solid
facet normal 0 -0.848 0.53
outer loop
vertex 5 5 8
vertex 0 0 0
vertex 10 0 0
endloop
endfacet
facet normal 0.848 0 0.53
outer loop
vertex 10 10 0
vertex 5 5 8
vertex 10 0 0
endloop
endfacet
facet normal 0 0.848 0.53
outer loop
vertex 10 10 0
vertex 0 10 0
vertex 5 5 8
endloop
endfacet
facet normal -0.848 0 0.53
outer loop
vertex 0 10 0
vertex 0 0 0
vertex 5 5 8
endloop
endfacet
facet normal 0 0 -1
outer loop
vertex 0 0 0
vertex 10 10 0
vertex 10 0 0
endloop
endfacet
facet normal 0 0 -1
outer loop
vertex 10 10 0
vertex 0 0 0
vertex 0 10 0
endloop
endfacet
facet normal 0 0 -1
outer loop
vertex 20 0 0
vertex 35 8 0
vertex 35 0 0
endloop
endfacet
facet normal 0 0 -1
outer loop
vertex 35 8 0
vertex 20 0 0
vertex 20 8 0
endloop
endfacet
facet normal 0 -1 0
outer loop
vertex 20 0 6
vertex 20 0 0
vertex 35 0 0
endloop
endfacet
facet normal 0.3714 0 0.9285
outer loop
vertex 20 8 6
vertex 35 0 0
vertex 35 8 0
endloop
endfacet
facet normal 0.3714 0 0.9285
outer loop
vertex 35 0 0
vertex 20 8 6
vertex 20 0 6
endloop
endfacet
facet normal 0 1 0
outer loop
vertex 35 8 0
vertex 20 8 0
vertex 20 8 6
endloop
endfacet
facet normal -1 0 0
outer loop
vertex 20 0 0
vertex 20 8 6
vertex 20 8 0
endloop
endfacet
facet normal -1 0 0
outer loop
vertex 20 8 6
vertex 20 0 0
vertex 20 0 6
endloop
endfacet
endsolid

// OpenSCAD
// Zweck: polyhedron – Pyramide und Keil mit ebenen Flächen (Flächen im Uhrzeigersinn von außen).
polyhedron(
    points = [[0, 0, 0], [10, 0, 0], [10, 10, 0], [0, 10, 0], [5, 5, 8]],
    faces = [[0, 1, 4], [1, 2, 4], [2, 3, 4], [3, 0, 4], [1, 0, 3, 2]]
);
translate([20, 0, 0]) polyhedron(
    [[0, 0, 0], [15, 0, 0], [15, 8, 0], [0, 8, 0], [0, 0, 6], [0, 8, 6]],
    [[0, 3, 2, 1], [0, 1, 4], [1, 2, 5, 4], [2, 3, 5], [3, 0, 4, 5]]
);
